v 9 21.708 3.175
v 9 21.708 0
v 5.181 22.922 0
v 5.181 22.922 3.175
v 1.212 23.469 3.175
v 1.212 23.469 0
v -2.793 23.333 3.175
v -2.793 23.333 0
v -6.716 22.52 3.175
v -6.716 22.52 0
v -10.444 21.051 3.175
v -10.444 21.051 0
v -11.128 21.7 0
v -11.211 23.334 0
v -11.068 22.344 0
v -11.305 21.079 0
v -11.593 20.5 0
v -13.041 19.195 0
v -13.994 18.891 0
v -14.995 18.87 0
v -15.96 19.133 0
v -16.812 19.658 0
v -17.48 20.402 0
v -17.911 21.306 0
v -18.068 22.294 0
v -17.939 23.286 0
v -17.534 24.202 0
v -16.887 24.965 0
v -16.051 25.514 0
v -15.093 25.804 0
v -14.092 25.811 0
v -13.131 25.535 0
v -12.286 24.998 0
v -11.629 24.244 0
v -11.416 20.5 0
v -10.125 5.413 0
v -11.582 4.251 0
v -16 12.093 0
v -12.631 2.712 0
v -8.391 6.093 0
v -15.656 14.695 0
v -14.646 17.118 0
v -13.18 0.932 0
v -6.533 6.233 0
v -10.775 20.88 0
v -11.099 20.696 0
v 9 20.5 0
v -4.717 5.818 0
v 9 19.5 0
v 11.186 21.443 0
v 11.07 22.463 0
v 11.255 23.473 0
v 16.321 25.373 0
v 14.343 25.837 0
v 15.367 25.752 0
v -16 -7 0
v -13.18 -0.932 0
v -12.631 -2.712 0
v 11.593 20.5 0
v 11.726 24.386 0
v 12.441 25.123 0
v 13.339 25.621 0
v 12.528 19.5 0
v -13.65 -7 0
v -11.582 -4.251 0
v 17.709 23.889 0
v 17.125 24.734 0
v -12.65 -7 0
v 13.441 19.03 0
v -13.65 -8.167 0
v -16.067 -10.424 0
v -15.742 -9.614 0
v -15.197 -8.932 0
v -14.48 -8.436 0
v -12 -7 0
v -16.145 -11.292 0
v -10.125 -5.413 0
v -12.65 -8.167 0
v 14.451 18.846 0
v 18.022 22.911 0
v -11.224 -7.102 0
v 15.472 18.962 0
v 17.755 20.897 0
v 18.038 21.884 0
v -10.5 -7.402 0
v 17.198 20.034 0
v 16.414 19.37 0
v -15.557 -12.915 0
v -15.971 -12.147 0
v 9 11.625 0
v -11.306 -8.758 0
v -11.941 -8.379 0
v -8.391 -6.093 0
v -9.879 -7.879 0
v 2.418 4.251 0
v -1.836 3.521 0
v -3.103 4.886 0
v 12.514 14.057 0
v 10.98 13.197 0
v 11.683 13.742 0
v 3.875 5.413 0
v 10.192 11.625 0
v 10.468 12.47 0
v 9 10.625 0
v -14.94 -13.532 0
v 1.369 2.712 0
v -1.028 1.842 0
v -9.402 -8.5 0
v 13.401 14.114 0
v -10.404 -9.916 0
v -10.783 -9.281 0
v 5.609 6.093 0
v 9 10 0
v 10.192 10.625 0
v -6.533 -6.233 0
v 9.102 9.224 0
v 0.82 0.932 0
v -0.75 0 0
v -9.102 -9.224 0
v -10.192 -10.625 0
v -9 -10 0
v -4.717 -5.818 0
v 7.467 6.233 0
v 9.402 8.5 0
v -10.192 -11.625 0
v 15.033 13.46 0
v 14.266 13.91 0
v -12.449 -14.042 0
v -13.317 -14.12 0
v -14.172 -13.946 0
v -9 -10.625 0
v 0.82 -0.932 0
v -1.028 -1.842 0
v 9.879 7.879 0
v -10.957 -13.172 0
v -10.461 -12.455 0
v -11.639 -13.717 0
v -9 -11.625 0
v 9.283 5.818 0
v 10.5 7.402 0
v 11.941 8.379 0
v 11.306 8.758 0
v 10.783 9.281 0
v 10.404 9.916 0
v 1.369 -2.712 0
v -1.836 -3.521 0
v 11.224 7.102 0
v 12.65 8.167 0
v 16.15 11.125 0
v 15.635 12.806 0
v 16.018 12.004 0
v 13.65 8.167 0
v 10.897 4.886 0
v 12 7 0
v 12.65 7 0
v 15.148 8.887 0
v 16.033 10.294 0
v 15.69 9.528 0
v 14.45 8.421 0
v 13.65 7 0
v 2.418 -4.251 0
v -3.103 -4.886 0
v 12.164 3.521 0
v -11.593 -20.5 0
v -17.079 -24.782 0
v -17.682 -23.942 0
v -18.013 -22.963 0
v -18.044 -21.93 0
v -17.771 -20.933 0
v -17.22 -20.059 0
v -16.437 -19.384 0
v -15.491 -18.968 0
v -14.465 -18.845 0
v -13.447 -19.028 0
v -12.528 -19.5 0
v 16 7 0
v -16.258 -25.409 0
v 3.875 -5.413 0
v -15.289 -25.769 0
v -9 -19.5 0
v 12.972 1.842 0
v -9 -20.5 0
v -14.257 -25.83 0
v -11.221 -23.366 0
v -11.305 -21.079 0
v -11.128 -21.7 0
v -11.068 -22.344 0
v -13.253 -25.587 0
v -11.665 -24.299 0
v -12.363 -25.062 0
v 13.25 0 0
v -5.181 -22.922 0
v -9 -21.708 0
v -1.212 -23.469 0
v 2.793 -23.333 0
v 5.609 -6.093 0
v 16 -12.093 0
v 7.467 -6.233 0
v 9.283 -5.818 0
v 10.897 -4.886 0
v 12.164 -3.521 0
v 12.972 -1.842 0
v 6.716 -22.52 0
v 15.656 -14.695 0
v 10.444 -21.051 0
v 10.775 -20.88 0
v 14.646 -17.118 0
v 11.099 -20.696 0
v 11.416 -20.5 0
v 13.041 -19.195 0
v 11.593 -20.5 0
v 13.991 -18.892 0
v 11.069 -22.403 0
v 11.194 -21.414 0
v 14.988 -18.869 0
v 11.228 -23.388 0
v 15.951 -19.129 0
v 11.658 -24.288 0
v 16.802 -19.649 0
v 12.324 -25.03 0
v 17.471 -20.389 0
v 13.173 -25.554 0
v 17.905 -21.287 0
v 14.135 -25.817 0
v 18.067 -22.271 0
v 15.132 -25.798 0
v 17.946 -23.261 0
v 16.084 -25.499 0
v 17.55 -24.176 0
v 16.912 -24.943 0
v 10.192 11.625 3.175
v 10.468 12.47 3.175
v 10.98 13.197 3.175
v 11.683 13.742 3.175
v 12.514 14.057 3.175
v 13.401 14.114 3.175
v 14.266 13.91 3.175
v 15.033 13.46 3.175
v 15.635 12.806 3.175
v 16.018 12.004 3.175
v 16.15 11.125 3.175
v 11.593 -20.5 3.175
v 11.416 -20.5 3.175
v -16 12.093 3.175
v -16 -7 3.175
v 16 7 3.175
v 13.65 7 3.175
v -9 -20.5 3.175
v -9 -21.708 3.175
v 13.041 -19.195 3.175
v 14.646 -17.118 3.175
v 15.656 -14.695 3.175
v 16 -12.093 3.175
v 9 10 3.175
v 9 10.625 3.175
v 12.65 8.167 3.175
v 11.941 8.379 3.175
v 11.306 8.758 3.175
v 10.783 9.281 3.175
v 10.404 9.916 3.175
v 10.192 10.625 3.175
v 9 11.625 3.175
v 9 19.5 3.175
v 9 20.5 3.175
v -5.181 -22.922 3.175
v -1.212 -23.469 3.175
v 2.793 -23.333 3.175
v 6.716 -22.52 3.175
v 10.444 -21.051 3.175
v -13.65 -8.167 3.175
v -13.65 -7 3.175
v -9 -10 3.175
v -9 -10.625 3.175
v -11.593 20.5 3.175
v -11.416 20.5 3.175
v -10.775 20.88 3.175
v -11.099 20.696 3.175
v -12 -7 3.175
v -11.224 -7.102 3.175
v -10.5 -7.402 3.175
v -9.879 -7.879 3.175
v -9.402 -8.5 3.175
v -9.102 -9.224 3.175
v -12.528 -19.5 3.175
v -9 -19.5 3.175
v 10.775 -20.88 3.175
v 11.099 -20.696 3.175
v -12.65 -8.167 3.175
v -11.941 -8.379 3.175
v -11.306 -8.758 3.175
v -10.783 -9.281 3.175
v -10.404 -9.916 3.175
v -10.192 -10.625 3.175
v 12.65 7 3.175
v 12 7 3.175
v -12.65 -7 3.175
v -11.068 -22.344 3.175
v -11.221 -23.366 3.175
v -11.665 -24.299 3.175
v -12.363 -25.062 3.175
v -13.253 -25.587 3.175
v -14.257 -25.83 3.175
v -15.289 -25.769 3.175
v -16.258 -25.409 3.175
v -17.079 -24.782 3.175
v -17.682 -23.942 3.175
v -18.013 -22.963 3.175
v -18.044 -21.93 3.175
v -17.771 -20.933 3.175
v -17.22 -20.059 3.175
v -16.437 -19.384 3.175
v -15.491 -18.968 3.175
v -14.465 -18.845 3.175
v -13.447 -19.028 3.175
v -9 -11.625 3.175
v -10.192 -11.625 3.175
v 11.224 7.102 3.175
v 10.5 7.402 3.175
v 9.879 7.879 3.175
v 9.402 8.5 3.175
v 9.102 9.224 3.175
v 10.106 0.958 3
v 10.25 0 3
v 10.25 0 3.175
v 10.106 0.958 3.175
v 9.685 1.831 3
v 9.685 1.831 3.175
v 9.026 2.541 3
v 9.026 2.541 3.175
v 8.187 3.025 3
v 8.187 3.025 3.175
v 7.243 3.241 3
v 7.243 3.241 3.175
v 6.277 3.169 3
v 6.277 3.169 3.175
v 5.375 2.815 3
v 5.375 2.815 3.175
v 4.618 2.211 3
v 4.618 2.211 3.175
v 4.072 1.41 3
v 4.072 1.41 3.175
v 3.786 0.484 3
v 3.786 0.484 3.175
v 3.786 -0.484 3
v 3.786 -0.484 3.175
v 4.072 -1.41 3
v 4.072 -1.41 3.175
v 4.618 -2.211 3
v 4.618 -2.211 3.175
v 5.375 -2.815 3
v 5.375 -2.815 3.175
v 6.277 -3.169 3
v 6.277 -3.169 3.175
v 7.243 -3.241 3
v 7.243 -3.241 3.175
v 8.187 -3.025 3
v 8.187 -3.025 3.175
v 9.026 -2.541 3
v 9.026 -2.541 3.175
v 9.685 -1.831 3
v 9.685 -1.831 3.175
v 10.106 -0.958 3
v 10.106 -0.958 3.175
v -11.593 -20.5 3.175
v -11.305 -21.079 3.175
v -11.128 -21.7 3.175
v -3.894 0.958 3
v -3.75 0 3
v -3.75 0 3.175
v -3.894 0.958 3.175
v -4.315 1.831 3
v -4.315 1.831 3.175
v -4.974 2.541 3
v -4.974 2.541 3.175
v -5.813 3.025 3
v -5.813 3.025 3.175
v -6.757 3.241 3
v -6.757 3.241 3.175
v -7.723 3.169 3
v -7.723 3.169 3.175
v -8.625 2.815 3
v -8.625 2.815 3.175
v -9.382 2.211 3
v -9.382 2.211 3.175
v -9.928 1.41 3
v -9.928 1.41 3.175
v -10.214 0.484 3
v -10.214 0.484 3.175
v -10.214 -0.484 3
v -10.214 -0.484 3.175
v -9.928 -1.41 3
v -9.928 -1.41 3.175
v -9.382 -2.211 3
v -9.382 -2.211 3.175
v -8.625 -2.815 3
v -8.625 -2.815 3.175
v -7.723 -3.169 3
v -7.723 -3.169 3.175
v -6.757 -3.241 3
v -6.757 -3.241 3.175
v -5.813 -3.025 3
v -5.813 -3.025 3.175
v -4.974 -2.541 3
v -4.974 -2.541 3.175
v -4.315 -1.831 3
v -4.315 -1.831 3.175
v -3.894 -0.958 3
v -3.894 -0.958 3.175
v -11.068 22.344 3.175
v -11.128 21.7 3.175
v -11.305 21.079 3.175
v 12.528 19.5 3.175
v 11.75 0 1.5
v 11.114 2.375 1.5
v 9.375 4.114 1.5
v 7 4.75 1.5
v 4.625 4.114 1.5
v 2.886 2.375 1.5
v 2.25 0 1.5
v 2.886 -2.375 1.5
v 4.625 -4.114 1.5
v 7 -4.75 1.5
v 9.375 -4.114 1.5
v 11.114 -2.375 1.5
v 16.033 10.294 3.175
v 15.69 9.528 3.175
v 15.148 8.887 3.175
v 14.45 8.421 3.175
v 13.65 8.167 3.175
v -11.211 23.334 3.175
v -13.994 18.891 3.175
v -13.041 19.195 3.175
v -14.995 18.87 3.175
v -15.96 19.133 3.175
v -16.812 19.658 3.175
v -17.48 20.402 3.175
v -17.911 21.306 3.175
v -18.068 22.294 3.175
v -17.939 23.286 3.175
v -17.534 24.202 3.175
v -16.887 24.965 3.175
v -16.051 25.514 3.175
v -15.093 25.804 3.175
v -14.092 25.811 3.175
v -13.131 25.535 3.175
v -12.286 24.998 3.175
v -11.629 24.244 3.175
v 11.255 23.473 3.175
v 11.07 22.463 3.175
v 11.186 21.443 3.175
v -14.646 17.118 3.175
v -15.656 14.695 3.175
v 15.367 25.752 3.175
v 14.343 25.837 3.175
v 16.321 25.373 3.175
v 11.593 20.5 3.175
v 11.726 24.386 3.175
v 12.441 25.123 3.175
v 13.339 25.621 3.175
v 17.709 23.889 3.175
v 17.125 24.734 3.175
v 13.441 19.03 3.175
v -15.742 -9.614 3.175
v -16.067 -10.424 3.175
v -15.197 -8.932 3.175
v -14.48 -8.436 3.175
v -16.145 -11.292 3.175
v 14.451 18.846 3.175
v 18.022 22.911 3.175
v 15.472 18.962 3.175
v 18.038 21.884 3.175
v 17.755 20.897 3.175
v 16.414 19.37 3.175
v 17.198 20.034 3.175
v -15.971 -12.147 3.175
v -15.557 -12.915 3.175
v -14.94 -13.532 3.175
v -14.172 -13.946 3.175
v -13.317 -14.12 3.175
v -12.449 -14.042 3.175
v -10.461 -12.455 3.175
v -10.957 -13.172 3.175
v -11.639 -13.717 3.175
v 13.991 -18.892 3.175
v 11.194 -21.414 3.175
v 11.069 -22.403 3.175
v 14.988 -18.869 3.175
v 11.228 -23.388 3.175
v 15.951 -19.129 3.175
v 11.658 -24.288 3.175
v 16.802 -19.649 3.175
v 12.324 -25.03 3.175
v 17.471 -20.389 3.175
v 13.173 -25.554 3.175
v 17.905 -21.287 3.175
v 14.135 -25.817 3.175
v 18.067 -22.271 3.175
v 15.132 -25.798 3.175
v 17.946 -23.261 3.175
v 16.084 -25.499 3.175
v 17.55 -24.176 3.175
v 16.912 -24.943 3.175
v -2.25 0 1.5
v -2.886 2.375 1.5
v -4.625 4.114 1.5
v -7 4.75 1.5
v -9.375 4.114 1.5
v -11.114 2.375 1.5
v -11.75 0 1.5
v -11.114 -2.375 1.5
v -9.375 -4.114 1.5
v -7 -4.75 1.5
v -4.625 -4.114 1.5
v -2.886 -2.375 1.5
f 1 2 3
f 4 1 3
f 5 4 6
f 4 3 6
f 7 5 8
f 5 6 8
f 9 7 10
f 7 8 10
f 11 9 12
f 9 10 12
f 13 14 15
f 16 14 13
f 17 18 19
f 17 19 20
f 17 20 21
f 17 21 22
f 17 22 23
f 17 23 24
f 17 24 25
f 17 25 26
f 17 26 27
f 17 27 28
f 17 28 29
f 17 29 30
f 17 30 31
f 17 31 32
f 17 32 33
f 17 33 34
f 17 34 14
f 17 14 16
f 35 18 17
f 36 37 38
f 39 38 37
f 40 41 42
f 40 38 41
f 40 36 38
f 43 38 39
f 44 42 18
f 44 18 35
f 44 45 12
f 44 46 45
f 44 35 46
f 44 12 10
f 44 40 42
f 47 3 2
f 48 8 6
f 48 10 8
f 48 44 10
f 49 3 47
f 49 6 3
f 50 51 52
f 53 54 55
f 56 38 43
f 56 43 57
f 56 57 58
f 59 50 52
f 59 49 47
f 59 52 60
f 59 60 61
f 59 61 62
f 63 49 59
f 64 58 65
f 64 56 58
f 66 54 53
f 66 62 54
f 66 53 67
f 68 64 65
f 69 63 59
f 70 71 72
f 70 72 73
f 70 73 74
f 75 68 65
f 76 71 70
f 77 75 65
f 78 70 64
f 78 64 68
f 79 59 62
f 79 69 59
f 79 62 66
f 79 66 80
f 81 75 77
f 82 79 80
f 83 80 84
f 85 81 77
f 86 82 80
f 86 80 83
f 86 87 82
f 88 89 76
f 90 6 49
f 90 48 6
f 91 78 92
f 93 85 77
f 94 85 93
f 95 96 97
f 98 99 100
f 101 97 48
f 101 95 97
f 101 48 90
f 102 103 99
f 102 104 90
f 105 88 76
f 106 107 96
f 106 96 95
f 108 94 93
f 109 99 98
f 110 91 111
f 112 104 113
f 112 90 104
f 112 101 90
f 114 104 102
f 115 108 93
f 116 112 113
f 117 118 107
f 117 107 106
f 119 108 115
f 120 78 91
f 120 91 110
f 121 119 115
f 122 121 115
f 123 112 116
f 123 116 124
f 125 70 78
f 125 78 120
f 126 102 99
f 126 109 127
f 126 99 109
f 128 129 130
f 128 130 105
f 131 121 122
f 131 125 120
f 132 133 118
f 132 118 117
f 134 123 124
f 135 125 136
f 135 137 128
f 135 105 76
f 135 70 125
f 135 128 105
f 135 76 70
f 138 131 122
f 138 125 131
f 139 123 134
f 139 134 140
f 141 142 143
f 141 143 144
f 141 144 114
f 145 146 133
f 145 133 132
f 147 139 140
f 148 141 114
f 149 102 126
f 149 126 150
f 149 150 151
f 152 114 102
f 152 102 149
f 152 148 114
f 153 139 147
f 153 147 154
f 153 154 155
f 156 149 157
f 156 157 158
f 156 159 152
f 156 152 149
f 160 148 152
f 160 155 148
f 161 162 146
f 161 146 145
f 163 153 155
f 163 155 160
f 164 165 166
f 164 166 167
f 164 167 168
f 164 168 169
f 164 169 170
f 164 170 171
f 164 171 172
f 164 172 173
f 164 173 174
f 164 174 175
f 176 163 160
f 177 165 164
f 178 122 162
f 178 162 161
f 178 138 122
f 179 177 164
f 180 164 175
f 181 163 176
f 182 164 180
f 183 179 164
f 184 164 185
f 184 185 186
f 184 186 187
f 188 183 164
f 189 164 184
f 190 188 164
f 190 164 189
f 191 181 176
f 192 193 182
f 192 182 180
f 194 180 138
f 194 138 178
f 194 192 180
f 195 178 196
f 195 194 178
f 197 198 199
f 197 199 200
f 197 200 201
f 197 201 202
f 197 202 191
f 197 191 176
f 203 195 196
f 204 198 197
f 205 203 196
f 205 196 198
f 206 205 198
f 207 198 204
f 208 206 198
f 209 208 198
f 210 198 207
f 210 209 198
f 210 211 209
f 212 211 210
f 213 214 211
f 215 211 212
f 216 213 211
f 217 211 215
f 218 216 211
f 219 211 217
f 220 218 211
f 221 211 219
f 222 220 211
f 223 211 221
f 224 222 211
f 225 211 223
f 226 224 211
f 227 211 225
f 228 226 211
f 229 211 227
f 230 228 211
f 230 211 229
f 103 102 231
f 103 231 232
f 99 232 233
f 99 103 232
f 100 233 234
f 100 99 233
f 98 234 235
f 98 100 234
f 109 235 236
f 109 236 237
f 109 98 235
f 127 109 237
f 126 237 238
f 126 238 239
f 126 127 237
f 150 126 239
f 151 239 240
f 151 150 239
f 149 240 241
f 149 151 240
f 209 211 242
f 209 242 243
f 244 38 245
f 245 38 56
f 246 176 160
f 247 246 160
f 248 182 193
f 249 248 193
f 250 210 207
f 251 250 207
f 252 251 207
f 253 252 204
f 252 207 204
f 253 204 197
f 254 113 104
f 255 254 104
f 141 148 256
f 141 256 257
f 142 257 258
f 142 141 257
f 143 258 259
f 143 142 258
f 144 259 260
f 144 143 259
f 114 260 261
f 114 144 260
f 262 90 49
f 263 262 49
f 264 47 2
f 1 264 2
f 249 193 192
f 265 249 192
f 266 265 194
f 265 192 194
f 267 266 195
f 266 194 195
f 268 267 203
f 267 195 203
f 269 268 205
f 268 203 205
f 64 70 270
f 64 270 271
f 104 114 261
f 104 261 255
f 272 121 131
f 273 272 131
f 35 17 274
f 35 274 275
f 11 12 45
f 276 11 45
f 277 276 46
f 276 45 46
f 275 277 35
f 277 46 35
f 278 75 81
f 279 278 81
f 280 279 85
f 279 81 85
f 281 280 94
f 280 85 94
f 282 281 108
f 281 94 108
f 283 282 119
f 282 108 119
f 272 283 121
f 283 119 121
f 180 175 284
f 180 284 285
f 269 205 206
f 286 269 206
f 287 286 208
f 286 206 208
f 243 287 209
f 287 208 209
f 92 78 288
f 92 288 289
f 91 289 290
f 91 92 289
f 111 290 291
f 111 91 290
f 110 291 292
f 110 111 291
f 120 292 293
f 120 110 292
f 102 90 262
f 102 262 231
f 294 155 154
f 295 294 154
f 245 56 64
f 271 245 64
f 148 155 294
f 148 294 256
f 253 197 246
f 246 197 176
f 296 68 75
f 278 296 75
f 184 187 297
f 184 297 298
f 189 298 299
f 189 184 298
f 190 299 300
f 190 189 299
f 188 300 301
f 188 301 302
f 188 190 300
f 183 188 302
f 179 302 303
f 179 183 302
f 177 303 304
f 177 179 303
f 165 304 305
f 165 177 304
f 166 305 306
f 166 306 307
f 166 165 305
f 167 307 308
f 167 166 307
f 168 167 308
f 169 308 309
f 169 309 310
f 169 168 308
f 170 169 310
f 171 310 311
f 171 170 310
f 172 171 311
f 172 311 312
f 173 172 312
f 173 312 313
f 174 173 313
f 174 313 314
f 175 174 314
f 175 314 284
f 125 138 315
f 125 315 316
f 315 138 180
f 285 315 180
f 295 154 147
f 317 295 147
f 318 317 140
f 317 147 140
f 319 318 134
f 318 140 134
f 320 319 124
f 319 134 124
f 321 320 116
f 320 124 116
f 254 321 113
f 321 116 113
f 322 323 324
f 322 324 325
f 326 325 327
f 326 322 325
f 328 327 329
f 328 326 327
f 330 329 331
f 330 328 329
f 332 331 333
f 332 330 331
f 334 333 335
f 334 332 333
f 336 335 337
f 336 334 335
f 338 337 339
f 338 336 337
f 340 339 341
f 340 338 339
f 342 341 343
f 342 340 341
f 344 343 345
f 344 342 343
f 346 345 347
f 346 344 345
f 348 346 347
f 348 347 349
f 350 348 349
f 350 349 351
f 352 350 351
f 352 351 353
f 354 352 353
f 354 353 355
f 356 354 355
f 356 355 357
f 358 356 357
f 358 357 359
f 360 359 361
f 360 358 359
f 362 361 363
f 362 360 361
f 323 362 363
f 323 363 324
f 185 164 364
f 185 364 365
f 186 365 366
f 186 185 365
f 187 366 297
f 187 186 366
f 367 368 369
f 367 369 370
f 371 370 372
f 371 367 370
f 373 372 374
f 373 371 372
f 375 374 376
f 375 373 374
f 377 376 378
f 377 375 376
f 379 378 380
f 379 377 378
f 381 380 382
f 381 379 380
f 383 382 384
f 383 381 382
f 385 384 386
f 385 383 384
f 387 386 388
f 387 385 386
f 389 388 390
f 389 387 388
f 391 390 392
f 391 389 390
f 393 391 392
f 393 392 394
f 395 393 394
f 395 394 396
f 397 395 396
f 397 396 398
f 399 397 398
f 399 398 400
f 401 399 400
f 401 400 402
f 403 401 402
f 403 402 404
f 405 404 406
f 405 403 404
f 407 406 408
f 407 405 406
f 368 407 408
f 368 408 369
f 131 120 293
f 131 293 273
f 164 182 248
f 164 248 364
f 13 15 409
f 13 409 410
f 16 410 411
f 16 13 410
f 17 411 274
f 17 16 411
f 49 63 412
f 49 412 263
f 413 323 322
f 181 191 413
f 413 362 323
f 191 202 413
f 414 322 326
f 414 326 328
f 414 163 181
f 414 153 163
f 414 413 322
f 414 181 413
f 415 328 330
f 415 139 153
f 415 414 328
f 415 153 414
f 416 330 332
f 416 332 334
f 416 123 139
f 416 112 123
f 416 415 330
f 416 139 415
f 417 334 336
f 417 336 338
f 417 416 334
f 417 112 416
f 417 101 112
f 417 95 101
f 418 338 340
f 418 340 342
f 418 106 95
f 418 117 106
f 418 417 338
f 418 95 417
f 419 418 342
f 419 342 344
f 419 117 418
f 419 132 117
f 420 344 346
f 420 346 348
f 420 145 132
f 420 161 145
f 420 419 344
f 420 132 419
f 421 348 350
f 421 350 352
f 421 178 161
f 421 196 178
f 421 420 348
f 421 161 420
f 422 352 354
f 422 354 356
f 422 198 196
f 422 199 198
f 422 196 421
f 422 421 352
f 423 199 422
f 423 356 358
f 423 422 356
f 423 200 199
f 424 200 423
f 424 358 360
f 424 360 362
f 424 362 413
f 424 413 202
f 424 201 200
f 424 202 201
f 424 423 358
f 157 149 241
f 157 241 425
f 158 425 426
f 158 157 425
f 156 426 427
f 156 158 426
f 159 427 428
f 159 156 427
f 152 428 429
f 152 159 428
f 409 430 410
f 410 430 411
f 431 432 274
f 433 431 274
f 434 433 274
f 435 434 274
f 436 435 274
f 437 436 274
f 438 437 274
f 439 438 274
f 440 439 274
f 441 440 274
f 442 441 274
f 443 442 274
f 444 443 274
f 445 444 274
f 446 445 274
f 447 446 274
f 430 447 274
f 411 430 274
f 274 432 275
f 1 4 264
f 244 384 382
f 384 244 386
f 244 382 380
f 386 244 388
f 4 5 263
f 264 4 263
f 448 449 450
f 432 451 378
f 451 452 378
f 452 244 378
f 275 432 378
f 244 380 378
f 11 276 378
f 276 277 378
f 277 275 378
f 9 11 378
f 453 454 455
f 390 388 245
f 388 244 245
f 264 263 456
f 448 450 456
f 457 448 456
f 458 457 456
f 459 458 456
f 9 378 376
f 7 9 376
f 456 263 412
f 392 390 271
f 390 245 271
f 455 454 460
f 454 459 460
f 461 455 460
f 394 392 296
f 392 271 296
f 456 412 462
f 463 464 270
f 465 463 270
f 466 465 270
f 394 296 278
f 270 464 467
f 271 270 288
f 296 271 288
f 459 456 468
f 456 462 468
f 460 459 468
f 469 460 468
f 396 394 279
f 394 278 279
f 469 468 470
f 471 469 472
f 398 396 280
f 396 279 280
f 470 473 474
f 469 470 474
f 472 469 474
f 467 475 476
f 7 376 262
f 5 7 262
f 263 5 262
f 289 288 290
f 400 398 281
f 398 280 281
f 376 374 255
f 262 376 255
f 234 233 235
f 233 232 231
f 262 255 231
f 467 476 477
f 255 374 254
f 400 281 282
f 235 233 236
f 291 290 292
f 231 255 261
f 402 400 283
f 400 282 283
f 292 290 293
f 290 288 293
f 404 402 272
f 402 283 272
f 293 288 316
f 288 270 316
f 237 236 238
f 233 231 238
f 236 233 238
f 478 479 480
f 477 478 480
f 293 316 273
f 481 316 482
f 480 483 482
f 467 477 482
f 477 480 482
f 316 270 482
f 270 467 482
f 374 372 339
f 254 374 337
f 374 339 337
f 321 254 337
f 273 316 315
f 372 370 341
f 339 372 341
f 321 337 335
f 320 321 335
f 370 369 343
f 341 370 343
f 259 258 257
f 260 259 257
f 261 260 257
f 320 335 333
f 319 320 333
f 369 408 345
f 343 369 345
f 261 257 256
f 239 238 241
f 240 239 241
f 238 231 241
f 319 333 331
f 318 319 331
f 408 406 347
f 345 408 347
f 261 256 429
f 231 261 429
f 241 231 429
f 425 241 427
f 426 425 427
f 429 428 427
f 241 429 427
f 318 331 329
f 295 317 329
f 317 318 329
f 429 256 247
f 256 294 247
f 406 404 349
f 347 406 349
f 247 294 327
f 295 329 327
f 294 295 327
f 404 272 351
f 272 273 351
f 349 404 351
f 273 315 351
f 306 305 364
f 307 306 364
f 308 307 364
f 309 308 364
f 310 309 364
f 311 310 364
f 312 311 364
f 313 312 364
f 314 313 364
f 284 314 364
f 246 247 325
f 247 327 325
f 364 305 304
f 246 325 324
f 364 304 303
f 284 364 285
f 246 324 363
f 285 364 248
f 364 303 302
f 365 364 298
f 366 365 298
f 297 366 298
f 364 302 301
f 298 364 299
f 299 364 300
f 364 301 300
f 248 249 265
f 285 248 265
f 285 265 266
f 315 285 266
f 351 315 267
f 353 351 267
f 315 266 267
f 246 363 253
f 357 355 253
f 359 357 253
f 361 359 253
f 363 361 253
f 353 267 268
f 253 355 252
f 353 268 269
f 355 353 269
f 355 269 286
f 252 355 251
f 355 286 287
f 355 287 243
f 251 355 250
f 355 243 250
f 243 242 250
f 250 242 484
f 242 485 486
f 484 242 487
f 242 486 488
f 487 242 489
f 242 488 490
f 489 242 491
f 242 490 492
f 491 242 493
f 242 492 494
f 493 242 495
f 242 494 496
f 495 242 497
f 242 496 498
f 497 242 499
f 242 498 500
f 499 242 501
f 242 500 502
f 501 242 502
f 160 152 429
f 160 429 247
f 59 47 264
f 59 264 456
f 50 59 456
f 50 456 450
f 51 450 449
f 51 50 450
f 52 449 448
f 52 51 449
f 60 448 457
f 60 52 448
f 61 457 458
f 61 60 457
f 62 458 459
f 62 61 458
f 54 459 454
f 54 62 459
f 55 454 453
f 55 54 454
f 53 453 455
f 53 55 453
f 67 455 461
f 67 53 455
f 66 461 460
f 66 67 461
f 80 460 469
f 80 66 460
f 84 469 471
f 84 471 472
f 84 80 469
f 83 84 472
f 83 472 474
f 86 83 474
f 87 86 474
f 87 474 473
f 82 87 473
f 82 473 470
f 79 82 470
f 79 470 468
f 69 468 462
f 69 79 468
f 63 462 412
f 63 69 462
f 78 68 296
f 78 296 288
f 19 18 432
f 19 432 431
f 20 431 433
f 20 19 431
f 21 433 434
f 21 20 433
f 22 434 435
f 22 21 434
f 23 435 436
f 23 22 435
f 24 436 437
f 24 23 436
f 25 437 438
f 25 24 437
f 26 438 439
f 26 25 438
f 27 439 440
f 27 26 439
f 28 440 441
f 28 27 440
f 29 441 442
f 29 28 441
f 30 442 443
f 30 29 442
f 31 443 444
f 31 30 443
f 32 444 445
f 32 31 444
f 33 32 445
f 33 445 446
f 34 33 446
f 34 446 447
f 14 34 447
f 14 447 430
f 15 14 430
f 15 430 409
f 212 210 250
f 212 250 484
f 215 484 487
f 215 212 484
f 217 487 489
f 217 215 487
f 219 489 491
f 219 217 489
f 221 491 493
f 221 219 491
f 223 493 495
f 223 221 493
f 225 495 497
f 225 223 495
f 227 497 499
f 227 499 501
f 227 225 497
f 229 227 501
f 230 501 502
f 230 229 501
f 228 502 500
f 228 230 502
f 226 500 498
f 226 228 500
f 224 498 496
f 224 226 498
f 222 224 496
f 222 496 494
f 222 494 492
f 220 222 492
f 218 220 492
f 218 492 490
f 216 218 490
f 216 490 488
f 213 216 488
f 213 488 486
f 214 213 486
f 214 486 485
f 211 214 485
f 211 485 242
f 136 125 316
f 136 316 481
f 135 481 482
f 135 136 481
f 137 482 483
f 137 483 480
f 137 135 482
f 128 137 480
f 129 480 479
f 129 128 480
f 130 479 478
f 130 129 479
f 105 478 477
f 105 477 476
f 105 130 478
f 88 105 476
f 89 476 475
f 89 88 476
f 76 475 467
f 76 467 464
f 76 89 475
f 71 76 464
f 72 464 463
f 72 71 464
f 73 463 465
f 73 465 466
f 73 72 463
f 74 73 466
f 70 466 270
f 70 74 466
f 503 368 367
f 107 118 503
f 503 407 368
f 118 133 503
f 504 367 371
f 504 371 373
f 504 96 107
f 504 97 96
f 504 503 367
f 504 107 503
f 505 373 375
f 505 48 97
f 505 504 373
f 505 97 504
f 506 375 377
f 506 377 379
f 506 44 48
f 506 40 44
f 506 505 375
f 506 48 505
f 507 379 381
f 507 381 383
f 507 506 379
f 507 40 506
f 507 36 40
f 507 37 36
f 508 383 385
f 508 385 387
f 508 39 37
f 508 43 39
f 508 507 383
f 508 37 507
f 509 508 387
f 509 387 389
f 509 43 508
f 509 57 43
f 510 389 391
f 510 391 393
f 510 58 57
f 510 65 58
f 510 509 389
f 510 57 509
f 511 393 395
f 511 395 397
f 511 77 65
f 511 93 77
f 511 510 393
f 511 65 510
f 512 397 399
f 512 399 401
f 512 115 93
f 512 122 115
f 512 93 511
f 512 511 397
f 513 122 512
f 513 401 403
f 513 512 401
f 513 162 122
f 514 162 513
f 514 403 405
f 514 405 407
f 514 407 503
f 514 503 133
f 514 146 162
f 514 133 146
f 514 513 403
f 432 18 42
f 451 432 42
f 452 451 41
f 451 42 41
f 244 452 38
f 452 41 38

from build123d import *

# Parameters (mm, degrees)
F0_R     = 3.25
F1_DEPTH = 3.175
F2_SIZE  = 3
F4_DEPTH = 3.175
F6_DEPTH = 3.175


with BuildPart() as f1:
    # F0 (on Top) → F1 (new body)
    with BuildSketch(Plane.XY):
        with BuildLine():
            Line((9, 10), (9, 21.7082933461))
            ThreePointArc((9, 21.7082933461), (-0.7933886028, 23.486603299), (-10.4444444444, 21.0514507872))
            ThreePointArc((-10.4444444444, 21.0514507872), (-14.498365856, 17.3638493894), (-16, 12.0933866224))
            Line((-16, 12.0933866224), (-16, -7))
            Line((-16, -7), (-12, -7))
            ThreePointArc((-12, -7), (-9.8786796564, -7.8786796564), (-9, -10))
            Line((-9, -10), (-9, -21.7082933461))
            ThreePointArc((-9, -21.7082933461), (0.7933886028, -23.486603299), (10.4444444444, -21.0514507872))
            ThreePointArc((10.4444444444, -21.0514507872), (14.498365856, -17.3638493894), (16, -12.0933866224))
            Line((16, -12.0933866224), (16, 7))
            Line((16, 7), (12, 7))
            ThreePointArc((12, 7), (9.8786796564, 7.8786796564), (9, 10))
        make_face()
        with Locations((-7, 0)):
            Circle(F0_R, mode=Mode.SUBTRACT)
        with Locations((7, 0)):
            Circle(F0_R, mode=Mode.SUBTRACT)
    extrude(amount=F1_DEPTH)

    # F2
    f2_edges = [f1.edges().sort_by_distance(p)[0] for p in [
        (-10.25, 0, 0),
        (3.75, 0, 0),
    ]]
    chamfer(f2_edges, length=F2_SIZE)

    # F3 (on face) → F4 (join, through all)
    with BuildSketch(Plane(origin=(0, 0, 0), x_dir=(1, 0, 0), z_dir=(0, 0, -1))):
        with BuildLine():
            ThreePointArc((-10.1919601085, 10.625), (-10.1605084316, 10.8741212192), (-10.15, 11.125))
            ThreePointArc((-10.15, 11.125), (-10.1605084316, 11.3758787808), (-10.1919601085, 11.625))
            Line((-10.1919601085, 11.625), (-12, 11.625))
            Line((-12, 11.625), (-12, 10.625))
            Line((-12, 10.625), (-10.1919601085, 10.625))
        make_face()
        with BuildLine():
            ThreePointArc((-10.1919601085, 11.625), (-10.1605084316, 11.3758787808), (-10.15, 11.125))
            ThreePointArc((-10.15, 11.125), (-10.1605084316, 10.8741212192), (-10.1919601085, 10.625))
            Line((-10.1919601085, 10.625), (-6, 10.625))
            Line((-6, 10.625), (-6, 11.625))
            Line((-6, 11.625), (-10.1919601085, 11.625))
        make_face()
        with BuildLine():
            Line((-12, 11.625), (-10.1919601085, 11.625))
            ThreePointArc((-10.1919601085, 11.625), (-15.2713203436, 13.2463203436), (-13.65, 8.1669601085))
            Line((-13.65, 8.1669601085), (-13.65, 10))
            Line((-13.65, 10), (-12.65, 10))
            Line((-12.65, 10), (-12.65, 8.1669601085))
            ThreePointArc((-12.65, 8.1669601085), (-11.0286796564, 9.0036796564), (-10.1919601085, 10.625))
            Line((-10.1919601085, 10.625), (-12, 10.625))
            Line((-12, 10.625), (-12, 11.625))
        make_face()
        with BuildLine():
            Line((-13.65, 10), (-13.65, 8.1669601085))
            ThreePointArc((-13.65, 8.1669601085), (-13.15, 8.125), (-12.65, 8.1669601085))
            Line((-12.65, 8.1669601085), (-12.65, 10))
            Line((-12.65, 10), (-13.65, 10))
        make_face()
        with BuildLine():
            ThreePointArc((-12.65, 8.1669601085), (-13.15, 8.125), (-13.65, 8.1669601085))
            Line((-13.65, 8.1669601085), (-13.65, 4))
            Line((-13.65, 4), (-12.65, 4))
            Line((-12.65, 4), (-12.65, 8.1669601085))
        make_face()
        with BuildLine():
            ThreePointArc((10.1919601085, -11.625), (13.4008787808, -14.1144915684), (16.15, -11.125))
            ThreePointArc((16.15, -11.125), (15.4412878475, -9.1885083269), (13.65, -8.1669601085))
            Line((13.65, -8.1669601085), (13.65, -10))
            Line((13.65, -10), (12.65, -10))
            Line((12.65, -10), (12.65, -8.1669601085))
            ThreePointArc((12.65, -8.1669601085), (11.0286796564, -9.0036796564), (10.1919601085, -10.625))
            Line((10.1919601085, -10.625), (12, -10.625))
            Line((12, -10.625), (12, -11.625))
            Line((12, -11.625), (10.1919601085, -11.625))
        make_face()
        with BuildLine():
            Line((13.65, -10), (13.65, -8.1669601085))
            ThreePointArc((13.65, -8.1669601085), (13.15, -8.125), (12.65, -8.1669601085))
            Line((12.65, -8.1669601085), (12.65, -10))
            Line((12.65, -10), (13.65, -10))
        make_face()
        with BuildLine():
            ThreePointArc((12.65, -8.1669601085), (13.15, -8.125), (13.65, -8.1669601085))
            Line((13.65, -8.1669601085), (13.65, -4))
            Line((13.65, -4), (12.65, -4))
            Line((12.65, -4), (12.65, -8.1669601085))
        make_face()
        with BuildLine():
            Line((6, -11.625), (10.1919601085, -11.625))
            ThreePointArc((10.1919601085, -11.625), (10.15, -11.125), (10.1919601085, -10.625))
            Line((10.1919601085, -10.625), (6, -10.625))
            Line((6, -10.625), (6, -11.625))
        make_face()
        with BuildLine():
            ThreePointArc((10.1919601085, -10.625), (10.15, -11.125), (10.1919601085, -11.625))
            Line((10.1919601085, -11.625), (12, -11.625))
            Line((12, -11.625), (12, -10.625))
            Line((12, -10.625), (10.1919601085, -10.625))
        make_face()
    extrude(amount=-F4_DEPTH)

    # F5 (on face) → F6 (join, through all)
    with BuildSketch(Plane(origin=(0, 0, 0), x_dir=(1, 0, 0), z_dir=(0, 0, -1))):
        with BuildLine():
            ThreePointArc((-11.5932314837, 20.5), (-11.2019974715, 21.3852645073), (-11.068175, 22.3438305439))
            ThreePointArc((-11.068175, 22.3438305439), (-17.6819252846, 23.9421293787), (-12.5279230945, 19.5))
            Line((-12.5279230945, 19.5), (-13.5525882542, 19.5))
            Line((-13.5525882542, 19.5), (-13.5525882542, 20.5))
            Line((-13.5525882542, 20.5), (-11.5932314837, 20.5))
        make_face()
        with BuildLine():
            Line((-13.5525882542, 19.5), (-12.5279230945, 19.5))
            ThreePointArc((-12.5279230945, 19.5), (-12.0112146406, 19.9538611465), (-11.5932314837, 20.5))
            Line((-11.5932314837, 20.5), (-13.5525882542, 20.5))
            Line((-13.5525882542, 20.5), (-13.5525882542, 19.5))
        make_face()
        with BuildLine():
            ThreePointArc((-11.5932314837, 20.5), (-12.0112146406, 19.9538611465), (-12.5279230945, 19.5))
            Line((-12.5279230945, 19.5), (-4.4474117458, 19.5))
            Line((-4.4474117458, 19.5), (-4.4474117458, 20.5))
            Line((-4.4474117458, 20.5), (-11.5932314837, 20.5))
        make_face()
        with BuildLine():
            ThreePointArc((-12.5279230945, -19.5), (-17.6819252846, -23.9421293787), (-11.068175, -22.3438305439))
            ThreePointArc((-11.068175, -22.3438305439), (-11.2019974715, -21.3852645073), (-11.5932314837, -20.5))
            Line((-11.5932314837, -20.5), (-13.5525882542, -20.5))
            Line((-13.5525882542, -20.5), (-13.5525882542, -19.5))
            Line((-13.5525882542, -19.5), (-12.5279230945, -19.5))
        make_face()
        with BuildLine():
            Line((-13.5525882542, -20.5), (-11.5932314837, -20.5))
            ThreePointArc((-11.5932314837, -20.5), (-12.0112146406, -19.9538611465), (-12.5279230945, -19.5))
            Line((-12.5279230945, -19.5), (-13.5525882542, -19.5))
            Line((-13.5525882542, -19.5), (-13.5525882542, -20.5))
        make_face()
        with BuildLine():
            ThreePointArc((-12.5279230945, -19.5), (-12.0112146406, -19.9538611465), (-11.5932314837, -20.5))
            Line((-11.5932314837, -20.5), (-4.4474117458, -20.5))
            Line((-4.4474117458, -20.5), (-4.4474117458, -19.5))
            Line((-4.4474117458, -19.5), (-12.5279230945, -19.5))
        make_face()
        with BuildLine():
            ThreePointArc((12.5279230945, 19.5), (16.1664738348, 19.2300802593), (18.068175, 22.3438305439))
            ThreePointArc((18.068175, 22.3438305439), (13.6096089635, 25.7100080724), (11.5932314837, 20.5))
            Line((11.5932314837, 20.5), (13.5525882542, 20.5))
            Line((13.5525882542, 20.5), (13.5525882542, 19.5))
            Line((13.5525882542, 19.5), (12.5279230945, 19.5))
        make_face()
        with BuildLine():
            Line((13.5525882542, 20.5), (11.5932314837, 20.5))
            ThreePointArc((11.5932314837, 20.5), (12.0112146406, 19.9538611465), (12.5279230945, 19.5))
            Line((12.5279230945, 19.5), (13.5525882542, 19.5))
            Line((13.5525882542, 19.5), (13.5525882542, 20.5))
        make_face()
        with BuildLine():
            ThreePointArc((12.5279230945, 19.5), (12.0112146406, 19.9538611465), (11.5932314837, 20.5))
            Line((11.5932314837, 20.5), (4.4474117458, 20.5))
            Line((4.4474117458, 20.5), (4.4474117458, 19.5))
            Line((4.4474117458, 19.5), (12.5279230945, 19.5))
        make_face()
        with BuildLine():
            ThreePointArc((11.5932314837, -20.5), (13.6096089635, -25.7100080724), (18.068175, -22.3438305439))
            ThreePointArc((18.068175, -22.3438305439), (16.1664738348, -19.2300802593), (12.5279230945, -19.5))
            Line((12.5279230945, -19.5), (13.5525882542, -19.5))
            Line((13.5525882542, -19.5), (13.5525882542, -20.5))
            Line((13.5525882542, -20.5), (11.5932314837, -20.5))
        make_face()
        with BuildLine():
            Line((13.5525882542, -19.5), (12.5279230945, -19.5))
            ThreePointArc((12.5279230945, -19.5), (12.0112146406, -19.9538611465), (11.5932314837, -20.5))
            Line((11.5932314837, -20.5), (13.5525882542, -20.5))
            Line((13.5525882542, -20.5), (13.5525882542, -19.5))
        make_face()
        with BuildLine():
            ThreePointArc((11.5932314837, -20.5), (12.0112146406, -19.9538611465), (12.5279230945, -19.5))
            Line((12.5279230945, -19.5), (4.4474117458, -19.5))
            Line((4.4474117458, -19.5), (4.4474117458, -20.5))
            Line((4.4474117458, -20.5), (11.5932314837, -20.5))
        make_face()
    extrude(amount=-F6_DEPTH)


solid = f1.part
